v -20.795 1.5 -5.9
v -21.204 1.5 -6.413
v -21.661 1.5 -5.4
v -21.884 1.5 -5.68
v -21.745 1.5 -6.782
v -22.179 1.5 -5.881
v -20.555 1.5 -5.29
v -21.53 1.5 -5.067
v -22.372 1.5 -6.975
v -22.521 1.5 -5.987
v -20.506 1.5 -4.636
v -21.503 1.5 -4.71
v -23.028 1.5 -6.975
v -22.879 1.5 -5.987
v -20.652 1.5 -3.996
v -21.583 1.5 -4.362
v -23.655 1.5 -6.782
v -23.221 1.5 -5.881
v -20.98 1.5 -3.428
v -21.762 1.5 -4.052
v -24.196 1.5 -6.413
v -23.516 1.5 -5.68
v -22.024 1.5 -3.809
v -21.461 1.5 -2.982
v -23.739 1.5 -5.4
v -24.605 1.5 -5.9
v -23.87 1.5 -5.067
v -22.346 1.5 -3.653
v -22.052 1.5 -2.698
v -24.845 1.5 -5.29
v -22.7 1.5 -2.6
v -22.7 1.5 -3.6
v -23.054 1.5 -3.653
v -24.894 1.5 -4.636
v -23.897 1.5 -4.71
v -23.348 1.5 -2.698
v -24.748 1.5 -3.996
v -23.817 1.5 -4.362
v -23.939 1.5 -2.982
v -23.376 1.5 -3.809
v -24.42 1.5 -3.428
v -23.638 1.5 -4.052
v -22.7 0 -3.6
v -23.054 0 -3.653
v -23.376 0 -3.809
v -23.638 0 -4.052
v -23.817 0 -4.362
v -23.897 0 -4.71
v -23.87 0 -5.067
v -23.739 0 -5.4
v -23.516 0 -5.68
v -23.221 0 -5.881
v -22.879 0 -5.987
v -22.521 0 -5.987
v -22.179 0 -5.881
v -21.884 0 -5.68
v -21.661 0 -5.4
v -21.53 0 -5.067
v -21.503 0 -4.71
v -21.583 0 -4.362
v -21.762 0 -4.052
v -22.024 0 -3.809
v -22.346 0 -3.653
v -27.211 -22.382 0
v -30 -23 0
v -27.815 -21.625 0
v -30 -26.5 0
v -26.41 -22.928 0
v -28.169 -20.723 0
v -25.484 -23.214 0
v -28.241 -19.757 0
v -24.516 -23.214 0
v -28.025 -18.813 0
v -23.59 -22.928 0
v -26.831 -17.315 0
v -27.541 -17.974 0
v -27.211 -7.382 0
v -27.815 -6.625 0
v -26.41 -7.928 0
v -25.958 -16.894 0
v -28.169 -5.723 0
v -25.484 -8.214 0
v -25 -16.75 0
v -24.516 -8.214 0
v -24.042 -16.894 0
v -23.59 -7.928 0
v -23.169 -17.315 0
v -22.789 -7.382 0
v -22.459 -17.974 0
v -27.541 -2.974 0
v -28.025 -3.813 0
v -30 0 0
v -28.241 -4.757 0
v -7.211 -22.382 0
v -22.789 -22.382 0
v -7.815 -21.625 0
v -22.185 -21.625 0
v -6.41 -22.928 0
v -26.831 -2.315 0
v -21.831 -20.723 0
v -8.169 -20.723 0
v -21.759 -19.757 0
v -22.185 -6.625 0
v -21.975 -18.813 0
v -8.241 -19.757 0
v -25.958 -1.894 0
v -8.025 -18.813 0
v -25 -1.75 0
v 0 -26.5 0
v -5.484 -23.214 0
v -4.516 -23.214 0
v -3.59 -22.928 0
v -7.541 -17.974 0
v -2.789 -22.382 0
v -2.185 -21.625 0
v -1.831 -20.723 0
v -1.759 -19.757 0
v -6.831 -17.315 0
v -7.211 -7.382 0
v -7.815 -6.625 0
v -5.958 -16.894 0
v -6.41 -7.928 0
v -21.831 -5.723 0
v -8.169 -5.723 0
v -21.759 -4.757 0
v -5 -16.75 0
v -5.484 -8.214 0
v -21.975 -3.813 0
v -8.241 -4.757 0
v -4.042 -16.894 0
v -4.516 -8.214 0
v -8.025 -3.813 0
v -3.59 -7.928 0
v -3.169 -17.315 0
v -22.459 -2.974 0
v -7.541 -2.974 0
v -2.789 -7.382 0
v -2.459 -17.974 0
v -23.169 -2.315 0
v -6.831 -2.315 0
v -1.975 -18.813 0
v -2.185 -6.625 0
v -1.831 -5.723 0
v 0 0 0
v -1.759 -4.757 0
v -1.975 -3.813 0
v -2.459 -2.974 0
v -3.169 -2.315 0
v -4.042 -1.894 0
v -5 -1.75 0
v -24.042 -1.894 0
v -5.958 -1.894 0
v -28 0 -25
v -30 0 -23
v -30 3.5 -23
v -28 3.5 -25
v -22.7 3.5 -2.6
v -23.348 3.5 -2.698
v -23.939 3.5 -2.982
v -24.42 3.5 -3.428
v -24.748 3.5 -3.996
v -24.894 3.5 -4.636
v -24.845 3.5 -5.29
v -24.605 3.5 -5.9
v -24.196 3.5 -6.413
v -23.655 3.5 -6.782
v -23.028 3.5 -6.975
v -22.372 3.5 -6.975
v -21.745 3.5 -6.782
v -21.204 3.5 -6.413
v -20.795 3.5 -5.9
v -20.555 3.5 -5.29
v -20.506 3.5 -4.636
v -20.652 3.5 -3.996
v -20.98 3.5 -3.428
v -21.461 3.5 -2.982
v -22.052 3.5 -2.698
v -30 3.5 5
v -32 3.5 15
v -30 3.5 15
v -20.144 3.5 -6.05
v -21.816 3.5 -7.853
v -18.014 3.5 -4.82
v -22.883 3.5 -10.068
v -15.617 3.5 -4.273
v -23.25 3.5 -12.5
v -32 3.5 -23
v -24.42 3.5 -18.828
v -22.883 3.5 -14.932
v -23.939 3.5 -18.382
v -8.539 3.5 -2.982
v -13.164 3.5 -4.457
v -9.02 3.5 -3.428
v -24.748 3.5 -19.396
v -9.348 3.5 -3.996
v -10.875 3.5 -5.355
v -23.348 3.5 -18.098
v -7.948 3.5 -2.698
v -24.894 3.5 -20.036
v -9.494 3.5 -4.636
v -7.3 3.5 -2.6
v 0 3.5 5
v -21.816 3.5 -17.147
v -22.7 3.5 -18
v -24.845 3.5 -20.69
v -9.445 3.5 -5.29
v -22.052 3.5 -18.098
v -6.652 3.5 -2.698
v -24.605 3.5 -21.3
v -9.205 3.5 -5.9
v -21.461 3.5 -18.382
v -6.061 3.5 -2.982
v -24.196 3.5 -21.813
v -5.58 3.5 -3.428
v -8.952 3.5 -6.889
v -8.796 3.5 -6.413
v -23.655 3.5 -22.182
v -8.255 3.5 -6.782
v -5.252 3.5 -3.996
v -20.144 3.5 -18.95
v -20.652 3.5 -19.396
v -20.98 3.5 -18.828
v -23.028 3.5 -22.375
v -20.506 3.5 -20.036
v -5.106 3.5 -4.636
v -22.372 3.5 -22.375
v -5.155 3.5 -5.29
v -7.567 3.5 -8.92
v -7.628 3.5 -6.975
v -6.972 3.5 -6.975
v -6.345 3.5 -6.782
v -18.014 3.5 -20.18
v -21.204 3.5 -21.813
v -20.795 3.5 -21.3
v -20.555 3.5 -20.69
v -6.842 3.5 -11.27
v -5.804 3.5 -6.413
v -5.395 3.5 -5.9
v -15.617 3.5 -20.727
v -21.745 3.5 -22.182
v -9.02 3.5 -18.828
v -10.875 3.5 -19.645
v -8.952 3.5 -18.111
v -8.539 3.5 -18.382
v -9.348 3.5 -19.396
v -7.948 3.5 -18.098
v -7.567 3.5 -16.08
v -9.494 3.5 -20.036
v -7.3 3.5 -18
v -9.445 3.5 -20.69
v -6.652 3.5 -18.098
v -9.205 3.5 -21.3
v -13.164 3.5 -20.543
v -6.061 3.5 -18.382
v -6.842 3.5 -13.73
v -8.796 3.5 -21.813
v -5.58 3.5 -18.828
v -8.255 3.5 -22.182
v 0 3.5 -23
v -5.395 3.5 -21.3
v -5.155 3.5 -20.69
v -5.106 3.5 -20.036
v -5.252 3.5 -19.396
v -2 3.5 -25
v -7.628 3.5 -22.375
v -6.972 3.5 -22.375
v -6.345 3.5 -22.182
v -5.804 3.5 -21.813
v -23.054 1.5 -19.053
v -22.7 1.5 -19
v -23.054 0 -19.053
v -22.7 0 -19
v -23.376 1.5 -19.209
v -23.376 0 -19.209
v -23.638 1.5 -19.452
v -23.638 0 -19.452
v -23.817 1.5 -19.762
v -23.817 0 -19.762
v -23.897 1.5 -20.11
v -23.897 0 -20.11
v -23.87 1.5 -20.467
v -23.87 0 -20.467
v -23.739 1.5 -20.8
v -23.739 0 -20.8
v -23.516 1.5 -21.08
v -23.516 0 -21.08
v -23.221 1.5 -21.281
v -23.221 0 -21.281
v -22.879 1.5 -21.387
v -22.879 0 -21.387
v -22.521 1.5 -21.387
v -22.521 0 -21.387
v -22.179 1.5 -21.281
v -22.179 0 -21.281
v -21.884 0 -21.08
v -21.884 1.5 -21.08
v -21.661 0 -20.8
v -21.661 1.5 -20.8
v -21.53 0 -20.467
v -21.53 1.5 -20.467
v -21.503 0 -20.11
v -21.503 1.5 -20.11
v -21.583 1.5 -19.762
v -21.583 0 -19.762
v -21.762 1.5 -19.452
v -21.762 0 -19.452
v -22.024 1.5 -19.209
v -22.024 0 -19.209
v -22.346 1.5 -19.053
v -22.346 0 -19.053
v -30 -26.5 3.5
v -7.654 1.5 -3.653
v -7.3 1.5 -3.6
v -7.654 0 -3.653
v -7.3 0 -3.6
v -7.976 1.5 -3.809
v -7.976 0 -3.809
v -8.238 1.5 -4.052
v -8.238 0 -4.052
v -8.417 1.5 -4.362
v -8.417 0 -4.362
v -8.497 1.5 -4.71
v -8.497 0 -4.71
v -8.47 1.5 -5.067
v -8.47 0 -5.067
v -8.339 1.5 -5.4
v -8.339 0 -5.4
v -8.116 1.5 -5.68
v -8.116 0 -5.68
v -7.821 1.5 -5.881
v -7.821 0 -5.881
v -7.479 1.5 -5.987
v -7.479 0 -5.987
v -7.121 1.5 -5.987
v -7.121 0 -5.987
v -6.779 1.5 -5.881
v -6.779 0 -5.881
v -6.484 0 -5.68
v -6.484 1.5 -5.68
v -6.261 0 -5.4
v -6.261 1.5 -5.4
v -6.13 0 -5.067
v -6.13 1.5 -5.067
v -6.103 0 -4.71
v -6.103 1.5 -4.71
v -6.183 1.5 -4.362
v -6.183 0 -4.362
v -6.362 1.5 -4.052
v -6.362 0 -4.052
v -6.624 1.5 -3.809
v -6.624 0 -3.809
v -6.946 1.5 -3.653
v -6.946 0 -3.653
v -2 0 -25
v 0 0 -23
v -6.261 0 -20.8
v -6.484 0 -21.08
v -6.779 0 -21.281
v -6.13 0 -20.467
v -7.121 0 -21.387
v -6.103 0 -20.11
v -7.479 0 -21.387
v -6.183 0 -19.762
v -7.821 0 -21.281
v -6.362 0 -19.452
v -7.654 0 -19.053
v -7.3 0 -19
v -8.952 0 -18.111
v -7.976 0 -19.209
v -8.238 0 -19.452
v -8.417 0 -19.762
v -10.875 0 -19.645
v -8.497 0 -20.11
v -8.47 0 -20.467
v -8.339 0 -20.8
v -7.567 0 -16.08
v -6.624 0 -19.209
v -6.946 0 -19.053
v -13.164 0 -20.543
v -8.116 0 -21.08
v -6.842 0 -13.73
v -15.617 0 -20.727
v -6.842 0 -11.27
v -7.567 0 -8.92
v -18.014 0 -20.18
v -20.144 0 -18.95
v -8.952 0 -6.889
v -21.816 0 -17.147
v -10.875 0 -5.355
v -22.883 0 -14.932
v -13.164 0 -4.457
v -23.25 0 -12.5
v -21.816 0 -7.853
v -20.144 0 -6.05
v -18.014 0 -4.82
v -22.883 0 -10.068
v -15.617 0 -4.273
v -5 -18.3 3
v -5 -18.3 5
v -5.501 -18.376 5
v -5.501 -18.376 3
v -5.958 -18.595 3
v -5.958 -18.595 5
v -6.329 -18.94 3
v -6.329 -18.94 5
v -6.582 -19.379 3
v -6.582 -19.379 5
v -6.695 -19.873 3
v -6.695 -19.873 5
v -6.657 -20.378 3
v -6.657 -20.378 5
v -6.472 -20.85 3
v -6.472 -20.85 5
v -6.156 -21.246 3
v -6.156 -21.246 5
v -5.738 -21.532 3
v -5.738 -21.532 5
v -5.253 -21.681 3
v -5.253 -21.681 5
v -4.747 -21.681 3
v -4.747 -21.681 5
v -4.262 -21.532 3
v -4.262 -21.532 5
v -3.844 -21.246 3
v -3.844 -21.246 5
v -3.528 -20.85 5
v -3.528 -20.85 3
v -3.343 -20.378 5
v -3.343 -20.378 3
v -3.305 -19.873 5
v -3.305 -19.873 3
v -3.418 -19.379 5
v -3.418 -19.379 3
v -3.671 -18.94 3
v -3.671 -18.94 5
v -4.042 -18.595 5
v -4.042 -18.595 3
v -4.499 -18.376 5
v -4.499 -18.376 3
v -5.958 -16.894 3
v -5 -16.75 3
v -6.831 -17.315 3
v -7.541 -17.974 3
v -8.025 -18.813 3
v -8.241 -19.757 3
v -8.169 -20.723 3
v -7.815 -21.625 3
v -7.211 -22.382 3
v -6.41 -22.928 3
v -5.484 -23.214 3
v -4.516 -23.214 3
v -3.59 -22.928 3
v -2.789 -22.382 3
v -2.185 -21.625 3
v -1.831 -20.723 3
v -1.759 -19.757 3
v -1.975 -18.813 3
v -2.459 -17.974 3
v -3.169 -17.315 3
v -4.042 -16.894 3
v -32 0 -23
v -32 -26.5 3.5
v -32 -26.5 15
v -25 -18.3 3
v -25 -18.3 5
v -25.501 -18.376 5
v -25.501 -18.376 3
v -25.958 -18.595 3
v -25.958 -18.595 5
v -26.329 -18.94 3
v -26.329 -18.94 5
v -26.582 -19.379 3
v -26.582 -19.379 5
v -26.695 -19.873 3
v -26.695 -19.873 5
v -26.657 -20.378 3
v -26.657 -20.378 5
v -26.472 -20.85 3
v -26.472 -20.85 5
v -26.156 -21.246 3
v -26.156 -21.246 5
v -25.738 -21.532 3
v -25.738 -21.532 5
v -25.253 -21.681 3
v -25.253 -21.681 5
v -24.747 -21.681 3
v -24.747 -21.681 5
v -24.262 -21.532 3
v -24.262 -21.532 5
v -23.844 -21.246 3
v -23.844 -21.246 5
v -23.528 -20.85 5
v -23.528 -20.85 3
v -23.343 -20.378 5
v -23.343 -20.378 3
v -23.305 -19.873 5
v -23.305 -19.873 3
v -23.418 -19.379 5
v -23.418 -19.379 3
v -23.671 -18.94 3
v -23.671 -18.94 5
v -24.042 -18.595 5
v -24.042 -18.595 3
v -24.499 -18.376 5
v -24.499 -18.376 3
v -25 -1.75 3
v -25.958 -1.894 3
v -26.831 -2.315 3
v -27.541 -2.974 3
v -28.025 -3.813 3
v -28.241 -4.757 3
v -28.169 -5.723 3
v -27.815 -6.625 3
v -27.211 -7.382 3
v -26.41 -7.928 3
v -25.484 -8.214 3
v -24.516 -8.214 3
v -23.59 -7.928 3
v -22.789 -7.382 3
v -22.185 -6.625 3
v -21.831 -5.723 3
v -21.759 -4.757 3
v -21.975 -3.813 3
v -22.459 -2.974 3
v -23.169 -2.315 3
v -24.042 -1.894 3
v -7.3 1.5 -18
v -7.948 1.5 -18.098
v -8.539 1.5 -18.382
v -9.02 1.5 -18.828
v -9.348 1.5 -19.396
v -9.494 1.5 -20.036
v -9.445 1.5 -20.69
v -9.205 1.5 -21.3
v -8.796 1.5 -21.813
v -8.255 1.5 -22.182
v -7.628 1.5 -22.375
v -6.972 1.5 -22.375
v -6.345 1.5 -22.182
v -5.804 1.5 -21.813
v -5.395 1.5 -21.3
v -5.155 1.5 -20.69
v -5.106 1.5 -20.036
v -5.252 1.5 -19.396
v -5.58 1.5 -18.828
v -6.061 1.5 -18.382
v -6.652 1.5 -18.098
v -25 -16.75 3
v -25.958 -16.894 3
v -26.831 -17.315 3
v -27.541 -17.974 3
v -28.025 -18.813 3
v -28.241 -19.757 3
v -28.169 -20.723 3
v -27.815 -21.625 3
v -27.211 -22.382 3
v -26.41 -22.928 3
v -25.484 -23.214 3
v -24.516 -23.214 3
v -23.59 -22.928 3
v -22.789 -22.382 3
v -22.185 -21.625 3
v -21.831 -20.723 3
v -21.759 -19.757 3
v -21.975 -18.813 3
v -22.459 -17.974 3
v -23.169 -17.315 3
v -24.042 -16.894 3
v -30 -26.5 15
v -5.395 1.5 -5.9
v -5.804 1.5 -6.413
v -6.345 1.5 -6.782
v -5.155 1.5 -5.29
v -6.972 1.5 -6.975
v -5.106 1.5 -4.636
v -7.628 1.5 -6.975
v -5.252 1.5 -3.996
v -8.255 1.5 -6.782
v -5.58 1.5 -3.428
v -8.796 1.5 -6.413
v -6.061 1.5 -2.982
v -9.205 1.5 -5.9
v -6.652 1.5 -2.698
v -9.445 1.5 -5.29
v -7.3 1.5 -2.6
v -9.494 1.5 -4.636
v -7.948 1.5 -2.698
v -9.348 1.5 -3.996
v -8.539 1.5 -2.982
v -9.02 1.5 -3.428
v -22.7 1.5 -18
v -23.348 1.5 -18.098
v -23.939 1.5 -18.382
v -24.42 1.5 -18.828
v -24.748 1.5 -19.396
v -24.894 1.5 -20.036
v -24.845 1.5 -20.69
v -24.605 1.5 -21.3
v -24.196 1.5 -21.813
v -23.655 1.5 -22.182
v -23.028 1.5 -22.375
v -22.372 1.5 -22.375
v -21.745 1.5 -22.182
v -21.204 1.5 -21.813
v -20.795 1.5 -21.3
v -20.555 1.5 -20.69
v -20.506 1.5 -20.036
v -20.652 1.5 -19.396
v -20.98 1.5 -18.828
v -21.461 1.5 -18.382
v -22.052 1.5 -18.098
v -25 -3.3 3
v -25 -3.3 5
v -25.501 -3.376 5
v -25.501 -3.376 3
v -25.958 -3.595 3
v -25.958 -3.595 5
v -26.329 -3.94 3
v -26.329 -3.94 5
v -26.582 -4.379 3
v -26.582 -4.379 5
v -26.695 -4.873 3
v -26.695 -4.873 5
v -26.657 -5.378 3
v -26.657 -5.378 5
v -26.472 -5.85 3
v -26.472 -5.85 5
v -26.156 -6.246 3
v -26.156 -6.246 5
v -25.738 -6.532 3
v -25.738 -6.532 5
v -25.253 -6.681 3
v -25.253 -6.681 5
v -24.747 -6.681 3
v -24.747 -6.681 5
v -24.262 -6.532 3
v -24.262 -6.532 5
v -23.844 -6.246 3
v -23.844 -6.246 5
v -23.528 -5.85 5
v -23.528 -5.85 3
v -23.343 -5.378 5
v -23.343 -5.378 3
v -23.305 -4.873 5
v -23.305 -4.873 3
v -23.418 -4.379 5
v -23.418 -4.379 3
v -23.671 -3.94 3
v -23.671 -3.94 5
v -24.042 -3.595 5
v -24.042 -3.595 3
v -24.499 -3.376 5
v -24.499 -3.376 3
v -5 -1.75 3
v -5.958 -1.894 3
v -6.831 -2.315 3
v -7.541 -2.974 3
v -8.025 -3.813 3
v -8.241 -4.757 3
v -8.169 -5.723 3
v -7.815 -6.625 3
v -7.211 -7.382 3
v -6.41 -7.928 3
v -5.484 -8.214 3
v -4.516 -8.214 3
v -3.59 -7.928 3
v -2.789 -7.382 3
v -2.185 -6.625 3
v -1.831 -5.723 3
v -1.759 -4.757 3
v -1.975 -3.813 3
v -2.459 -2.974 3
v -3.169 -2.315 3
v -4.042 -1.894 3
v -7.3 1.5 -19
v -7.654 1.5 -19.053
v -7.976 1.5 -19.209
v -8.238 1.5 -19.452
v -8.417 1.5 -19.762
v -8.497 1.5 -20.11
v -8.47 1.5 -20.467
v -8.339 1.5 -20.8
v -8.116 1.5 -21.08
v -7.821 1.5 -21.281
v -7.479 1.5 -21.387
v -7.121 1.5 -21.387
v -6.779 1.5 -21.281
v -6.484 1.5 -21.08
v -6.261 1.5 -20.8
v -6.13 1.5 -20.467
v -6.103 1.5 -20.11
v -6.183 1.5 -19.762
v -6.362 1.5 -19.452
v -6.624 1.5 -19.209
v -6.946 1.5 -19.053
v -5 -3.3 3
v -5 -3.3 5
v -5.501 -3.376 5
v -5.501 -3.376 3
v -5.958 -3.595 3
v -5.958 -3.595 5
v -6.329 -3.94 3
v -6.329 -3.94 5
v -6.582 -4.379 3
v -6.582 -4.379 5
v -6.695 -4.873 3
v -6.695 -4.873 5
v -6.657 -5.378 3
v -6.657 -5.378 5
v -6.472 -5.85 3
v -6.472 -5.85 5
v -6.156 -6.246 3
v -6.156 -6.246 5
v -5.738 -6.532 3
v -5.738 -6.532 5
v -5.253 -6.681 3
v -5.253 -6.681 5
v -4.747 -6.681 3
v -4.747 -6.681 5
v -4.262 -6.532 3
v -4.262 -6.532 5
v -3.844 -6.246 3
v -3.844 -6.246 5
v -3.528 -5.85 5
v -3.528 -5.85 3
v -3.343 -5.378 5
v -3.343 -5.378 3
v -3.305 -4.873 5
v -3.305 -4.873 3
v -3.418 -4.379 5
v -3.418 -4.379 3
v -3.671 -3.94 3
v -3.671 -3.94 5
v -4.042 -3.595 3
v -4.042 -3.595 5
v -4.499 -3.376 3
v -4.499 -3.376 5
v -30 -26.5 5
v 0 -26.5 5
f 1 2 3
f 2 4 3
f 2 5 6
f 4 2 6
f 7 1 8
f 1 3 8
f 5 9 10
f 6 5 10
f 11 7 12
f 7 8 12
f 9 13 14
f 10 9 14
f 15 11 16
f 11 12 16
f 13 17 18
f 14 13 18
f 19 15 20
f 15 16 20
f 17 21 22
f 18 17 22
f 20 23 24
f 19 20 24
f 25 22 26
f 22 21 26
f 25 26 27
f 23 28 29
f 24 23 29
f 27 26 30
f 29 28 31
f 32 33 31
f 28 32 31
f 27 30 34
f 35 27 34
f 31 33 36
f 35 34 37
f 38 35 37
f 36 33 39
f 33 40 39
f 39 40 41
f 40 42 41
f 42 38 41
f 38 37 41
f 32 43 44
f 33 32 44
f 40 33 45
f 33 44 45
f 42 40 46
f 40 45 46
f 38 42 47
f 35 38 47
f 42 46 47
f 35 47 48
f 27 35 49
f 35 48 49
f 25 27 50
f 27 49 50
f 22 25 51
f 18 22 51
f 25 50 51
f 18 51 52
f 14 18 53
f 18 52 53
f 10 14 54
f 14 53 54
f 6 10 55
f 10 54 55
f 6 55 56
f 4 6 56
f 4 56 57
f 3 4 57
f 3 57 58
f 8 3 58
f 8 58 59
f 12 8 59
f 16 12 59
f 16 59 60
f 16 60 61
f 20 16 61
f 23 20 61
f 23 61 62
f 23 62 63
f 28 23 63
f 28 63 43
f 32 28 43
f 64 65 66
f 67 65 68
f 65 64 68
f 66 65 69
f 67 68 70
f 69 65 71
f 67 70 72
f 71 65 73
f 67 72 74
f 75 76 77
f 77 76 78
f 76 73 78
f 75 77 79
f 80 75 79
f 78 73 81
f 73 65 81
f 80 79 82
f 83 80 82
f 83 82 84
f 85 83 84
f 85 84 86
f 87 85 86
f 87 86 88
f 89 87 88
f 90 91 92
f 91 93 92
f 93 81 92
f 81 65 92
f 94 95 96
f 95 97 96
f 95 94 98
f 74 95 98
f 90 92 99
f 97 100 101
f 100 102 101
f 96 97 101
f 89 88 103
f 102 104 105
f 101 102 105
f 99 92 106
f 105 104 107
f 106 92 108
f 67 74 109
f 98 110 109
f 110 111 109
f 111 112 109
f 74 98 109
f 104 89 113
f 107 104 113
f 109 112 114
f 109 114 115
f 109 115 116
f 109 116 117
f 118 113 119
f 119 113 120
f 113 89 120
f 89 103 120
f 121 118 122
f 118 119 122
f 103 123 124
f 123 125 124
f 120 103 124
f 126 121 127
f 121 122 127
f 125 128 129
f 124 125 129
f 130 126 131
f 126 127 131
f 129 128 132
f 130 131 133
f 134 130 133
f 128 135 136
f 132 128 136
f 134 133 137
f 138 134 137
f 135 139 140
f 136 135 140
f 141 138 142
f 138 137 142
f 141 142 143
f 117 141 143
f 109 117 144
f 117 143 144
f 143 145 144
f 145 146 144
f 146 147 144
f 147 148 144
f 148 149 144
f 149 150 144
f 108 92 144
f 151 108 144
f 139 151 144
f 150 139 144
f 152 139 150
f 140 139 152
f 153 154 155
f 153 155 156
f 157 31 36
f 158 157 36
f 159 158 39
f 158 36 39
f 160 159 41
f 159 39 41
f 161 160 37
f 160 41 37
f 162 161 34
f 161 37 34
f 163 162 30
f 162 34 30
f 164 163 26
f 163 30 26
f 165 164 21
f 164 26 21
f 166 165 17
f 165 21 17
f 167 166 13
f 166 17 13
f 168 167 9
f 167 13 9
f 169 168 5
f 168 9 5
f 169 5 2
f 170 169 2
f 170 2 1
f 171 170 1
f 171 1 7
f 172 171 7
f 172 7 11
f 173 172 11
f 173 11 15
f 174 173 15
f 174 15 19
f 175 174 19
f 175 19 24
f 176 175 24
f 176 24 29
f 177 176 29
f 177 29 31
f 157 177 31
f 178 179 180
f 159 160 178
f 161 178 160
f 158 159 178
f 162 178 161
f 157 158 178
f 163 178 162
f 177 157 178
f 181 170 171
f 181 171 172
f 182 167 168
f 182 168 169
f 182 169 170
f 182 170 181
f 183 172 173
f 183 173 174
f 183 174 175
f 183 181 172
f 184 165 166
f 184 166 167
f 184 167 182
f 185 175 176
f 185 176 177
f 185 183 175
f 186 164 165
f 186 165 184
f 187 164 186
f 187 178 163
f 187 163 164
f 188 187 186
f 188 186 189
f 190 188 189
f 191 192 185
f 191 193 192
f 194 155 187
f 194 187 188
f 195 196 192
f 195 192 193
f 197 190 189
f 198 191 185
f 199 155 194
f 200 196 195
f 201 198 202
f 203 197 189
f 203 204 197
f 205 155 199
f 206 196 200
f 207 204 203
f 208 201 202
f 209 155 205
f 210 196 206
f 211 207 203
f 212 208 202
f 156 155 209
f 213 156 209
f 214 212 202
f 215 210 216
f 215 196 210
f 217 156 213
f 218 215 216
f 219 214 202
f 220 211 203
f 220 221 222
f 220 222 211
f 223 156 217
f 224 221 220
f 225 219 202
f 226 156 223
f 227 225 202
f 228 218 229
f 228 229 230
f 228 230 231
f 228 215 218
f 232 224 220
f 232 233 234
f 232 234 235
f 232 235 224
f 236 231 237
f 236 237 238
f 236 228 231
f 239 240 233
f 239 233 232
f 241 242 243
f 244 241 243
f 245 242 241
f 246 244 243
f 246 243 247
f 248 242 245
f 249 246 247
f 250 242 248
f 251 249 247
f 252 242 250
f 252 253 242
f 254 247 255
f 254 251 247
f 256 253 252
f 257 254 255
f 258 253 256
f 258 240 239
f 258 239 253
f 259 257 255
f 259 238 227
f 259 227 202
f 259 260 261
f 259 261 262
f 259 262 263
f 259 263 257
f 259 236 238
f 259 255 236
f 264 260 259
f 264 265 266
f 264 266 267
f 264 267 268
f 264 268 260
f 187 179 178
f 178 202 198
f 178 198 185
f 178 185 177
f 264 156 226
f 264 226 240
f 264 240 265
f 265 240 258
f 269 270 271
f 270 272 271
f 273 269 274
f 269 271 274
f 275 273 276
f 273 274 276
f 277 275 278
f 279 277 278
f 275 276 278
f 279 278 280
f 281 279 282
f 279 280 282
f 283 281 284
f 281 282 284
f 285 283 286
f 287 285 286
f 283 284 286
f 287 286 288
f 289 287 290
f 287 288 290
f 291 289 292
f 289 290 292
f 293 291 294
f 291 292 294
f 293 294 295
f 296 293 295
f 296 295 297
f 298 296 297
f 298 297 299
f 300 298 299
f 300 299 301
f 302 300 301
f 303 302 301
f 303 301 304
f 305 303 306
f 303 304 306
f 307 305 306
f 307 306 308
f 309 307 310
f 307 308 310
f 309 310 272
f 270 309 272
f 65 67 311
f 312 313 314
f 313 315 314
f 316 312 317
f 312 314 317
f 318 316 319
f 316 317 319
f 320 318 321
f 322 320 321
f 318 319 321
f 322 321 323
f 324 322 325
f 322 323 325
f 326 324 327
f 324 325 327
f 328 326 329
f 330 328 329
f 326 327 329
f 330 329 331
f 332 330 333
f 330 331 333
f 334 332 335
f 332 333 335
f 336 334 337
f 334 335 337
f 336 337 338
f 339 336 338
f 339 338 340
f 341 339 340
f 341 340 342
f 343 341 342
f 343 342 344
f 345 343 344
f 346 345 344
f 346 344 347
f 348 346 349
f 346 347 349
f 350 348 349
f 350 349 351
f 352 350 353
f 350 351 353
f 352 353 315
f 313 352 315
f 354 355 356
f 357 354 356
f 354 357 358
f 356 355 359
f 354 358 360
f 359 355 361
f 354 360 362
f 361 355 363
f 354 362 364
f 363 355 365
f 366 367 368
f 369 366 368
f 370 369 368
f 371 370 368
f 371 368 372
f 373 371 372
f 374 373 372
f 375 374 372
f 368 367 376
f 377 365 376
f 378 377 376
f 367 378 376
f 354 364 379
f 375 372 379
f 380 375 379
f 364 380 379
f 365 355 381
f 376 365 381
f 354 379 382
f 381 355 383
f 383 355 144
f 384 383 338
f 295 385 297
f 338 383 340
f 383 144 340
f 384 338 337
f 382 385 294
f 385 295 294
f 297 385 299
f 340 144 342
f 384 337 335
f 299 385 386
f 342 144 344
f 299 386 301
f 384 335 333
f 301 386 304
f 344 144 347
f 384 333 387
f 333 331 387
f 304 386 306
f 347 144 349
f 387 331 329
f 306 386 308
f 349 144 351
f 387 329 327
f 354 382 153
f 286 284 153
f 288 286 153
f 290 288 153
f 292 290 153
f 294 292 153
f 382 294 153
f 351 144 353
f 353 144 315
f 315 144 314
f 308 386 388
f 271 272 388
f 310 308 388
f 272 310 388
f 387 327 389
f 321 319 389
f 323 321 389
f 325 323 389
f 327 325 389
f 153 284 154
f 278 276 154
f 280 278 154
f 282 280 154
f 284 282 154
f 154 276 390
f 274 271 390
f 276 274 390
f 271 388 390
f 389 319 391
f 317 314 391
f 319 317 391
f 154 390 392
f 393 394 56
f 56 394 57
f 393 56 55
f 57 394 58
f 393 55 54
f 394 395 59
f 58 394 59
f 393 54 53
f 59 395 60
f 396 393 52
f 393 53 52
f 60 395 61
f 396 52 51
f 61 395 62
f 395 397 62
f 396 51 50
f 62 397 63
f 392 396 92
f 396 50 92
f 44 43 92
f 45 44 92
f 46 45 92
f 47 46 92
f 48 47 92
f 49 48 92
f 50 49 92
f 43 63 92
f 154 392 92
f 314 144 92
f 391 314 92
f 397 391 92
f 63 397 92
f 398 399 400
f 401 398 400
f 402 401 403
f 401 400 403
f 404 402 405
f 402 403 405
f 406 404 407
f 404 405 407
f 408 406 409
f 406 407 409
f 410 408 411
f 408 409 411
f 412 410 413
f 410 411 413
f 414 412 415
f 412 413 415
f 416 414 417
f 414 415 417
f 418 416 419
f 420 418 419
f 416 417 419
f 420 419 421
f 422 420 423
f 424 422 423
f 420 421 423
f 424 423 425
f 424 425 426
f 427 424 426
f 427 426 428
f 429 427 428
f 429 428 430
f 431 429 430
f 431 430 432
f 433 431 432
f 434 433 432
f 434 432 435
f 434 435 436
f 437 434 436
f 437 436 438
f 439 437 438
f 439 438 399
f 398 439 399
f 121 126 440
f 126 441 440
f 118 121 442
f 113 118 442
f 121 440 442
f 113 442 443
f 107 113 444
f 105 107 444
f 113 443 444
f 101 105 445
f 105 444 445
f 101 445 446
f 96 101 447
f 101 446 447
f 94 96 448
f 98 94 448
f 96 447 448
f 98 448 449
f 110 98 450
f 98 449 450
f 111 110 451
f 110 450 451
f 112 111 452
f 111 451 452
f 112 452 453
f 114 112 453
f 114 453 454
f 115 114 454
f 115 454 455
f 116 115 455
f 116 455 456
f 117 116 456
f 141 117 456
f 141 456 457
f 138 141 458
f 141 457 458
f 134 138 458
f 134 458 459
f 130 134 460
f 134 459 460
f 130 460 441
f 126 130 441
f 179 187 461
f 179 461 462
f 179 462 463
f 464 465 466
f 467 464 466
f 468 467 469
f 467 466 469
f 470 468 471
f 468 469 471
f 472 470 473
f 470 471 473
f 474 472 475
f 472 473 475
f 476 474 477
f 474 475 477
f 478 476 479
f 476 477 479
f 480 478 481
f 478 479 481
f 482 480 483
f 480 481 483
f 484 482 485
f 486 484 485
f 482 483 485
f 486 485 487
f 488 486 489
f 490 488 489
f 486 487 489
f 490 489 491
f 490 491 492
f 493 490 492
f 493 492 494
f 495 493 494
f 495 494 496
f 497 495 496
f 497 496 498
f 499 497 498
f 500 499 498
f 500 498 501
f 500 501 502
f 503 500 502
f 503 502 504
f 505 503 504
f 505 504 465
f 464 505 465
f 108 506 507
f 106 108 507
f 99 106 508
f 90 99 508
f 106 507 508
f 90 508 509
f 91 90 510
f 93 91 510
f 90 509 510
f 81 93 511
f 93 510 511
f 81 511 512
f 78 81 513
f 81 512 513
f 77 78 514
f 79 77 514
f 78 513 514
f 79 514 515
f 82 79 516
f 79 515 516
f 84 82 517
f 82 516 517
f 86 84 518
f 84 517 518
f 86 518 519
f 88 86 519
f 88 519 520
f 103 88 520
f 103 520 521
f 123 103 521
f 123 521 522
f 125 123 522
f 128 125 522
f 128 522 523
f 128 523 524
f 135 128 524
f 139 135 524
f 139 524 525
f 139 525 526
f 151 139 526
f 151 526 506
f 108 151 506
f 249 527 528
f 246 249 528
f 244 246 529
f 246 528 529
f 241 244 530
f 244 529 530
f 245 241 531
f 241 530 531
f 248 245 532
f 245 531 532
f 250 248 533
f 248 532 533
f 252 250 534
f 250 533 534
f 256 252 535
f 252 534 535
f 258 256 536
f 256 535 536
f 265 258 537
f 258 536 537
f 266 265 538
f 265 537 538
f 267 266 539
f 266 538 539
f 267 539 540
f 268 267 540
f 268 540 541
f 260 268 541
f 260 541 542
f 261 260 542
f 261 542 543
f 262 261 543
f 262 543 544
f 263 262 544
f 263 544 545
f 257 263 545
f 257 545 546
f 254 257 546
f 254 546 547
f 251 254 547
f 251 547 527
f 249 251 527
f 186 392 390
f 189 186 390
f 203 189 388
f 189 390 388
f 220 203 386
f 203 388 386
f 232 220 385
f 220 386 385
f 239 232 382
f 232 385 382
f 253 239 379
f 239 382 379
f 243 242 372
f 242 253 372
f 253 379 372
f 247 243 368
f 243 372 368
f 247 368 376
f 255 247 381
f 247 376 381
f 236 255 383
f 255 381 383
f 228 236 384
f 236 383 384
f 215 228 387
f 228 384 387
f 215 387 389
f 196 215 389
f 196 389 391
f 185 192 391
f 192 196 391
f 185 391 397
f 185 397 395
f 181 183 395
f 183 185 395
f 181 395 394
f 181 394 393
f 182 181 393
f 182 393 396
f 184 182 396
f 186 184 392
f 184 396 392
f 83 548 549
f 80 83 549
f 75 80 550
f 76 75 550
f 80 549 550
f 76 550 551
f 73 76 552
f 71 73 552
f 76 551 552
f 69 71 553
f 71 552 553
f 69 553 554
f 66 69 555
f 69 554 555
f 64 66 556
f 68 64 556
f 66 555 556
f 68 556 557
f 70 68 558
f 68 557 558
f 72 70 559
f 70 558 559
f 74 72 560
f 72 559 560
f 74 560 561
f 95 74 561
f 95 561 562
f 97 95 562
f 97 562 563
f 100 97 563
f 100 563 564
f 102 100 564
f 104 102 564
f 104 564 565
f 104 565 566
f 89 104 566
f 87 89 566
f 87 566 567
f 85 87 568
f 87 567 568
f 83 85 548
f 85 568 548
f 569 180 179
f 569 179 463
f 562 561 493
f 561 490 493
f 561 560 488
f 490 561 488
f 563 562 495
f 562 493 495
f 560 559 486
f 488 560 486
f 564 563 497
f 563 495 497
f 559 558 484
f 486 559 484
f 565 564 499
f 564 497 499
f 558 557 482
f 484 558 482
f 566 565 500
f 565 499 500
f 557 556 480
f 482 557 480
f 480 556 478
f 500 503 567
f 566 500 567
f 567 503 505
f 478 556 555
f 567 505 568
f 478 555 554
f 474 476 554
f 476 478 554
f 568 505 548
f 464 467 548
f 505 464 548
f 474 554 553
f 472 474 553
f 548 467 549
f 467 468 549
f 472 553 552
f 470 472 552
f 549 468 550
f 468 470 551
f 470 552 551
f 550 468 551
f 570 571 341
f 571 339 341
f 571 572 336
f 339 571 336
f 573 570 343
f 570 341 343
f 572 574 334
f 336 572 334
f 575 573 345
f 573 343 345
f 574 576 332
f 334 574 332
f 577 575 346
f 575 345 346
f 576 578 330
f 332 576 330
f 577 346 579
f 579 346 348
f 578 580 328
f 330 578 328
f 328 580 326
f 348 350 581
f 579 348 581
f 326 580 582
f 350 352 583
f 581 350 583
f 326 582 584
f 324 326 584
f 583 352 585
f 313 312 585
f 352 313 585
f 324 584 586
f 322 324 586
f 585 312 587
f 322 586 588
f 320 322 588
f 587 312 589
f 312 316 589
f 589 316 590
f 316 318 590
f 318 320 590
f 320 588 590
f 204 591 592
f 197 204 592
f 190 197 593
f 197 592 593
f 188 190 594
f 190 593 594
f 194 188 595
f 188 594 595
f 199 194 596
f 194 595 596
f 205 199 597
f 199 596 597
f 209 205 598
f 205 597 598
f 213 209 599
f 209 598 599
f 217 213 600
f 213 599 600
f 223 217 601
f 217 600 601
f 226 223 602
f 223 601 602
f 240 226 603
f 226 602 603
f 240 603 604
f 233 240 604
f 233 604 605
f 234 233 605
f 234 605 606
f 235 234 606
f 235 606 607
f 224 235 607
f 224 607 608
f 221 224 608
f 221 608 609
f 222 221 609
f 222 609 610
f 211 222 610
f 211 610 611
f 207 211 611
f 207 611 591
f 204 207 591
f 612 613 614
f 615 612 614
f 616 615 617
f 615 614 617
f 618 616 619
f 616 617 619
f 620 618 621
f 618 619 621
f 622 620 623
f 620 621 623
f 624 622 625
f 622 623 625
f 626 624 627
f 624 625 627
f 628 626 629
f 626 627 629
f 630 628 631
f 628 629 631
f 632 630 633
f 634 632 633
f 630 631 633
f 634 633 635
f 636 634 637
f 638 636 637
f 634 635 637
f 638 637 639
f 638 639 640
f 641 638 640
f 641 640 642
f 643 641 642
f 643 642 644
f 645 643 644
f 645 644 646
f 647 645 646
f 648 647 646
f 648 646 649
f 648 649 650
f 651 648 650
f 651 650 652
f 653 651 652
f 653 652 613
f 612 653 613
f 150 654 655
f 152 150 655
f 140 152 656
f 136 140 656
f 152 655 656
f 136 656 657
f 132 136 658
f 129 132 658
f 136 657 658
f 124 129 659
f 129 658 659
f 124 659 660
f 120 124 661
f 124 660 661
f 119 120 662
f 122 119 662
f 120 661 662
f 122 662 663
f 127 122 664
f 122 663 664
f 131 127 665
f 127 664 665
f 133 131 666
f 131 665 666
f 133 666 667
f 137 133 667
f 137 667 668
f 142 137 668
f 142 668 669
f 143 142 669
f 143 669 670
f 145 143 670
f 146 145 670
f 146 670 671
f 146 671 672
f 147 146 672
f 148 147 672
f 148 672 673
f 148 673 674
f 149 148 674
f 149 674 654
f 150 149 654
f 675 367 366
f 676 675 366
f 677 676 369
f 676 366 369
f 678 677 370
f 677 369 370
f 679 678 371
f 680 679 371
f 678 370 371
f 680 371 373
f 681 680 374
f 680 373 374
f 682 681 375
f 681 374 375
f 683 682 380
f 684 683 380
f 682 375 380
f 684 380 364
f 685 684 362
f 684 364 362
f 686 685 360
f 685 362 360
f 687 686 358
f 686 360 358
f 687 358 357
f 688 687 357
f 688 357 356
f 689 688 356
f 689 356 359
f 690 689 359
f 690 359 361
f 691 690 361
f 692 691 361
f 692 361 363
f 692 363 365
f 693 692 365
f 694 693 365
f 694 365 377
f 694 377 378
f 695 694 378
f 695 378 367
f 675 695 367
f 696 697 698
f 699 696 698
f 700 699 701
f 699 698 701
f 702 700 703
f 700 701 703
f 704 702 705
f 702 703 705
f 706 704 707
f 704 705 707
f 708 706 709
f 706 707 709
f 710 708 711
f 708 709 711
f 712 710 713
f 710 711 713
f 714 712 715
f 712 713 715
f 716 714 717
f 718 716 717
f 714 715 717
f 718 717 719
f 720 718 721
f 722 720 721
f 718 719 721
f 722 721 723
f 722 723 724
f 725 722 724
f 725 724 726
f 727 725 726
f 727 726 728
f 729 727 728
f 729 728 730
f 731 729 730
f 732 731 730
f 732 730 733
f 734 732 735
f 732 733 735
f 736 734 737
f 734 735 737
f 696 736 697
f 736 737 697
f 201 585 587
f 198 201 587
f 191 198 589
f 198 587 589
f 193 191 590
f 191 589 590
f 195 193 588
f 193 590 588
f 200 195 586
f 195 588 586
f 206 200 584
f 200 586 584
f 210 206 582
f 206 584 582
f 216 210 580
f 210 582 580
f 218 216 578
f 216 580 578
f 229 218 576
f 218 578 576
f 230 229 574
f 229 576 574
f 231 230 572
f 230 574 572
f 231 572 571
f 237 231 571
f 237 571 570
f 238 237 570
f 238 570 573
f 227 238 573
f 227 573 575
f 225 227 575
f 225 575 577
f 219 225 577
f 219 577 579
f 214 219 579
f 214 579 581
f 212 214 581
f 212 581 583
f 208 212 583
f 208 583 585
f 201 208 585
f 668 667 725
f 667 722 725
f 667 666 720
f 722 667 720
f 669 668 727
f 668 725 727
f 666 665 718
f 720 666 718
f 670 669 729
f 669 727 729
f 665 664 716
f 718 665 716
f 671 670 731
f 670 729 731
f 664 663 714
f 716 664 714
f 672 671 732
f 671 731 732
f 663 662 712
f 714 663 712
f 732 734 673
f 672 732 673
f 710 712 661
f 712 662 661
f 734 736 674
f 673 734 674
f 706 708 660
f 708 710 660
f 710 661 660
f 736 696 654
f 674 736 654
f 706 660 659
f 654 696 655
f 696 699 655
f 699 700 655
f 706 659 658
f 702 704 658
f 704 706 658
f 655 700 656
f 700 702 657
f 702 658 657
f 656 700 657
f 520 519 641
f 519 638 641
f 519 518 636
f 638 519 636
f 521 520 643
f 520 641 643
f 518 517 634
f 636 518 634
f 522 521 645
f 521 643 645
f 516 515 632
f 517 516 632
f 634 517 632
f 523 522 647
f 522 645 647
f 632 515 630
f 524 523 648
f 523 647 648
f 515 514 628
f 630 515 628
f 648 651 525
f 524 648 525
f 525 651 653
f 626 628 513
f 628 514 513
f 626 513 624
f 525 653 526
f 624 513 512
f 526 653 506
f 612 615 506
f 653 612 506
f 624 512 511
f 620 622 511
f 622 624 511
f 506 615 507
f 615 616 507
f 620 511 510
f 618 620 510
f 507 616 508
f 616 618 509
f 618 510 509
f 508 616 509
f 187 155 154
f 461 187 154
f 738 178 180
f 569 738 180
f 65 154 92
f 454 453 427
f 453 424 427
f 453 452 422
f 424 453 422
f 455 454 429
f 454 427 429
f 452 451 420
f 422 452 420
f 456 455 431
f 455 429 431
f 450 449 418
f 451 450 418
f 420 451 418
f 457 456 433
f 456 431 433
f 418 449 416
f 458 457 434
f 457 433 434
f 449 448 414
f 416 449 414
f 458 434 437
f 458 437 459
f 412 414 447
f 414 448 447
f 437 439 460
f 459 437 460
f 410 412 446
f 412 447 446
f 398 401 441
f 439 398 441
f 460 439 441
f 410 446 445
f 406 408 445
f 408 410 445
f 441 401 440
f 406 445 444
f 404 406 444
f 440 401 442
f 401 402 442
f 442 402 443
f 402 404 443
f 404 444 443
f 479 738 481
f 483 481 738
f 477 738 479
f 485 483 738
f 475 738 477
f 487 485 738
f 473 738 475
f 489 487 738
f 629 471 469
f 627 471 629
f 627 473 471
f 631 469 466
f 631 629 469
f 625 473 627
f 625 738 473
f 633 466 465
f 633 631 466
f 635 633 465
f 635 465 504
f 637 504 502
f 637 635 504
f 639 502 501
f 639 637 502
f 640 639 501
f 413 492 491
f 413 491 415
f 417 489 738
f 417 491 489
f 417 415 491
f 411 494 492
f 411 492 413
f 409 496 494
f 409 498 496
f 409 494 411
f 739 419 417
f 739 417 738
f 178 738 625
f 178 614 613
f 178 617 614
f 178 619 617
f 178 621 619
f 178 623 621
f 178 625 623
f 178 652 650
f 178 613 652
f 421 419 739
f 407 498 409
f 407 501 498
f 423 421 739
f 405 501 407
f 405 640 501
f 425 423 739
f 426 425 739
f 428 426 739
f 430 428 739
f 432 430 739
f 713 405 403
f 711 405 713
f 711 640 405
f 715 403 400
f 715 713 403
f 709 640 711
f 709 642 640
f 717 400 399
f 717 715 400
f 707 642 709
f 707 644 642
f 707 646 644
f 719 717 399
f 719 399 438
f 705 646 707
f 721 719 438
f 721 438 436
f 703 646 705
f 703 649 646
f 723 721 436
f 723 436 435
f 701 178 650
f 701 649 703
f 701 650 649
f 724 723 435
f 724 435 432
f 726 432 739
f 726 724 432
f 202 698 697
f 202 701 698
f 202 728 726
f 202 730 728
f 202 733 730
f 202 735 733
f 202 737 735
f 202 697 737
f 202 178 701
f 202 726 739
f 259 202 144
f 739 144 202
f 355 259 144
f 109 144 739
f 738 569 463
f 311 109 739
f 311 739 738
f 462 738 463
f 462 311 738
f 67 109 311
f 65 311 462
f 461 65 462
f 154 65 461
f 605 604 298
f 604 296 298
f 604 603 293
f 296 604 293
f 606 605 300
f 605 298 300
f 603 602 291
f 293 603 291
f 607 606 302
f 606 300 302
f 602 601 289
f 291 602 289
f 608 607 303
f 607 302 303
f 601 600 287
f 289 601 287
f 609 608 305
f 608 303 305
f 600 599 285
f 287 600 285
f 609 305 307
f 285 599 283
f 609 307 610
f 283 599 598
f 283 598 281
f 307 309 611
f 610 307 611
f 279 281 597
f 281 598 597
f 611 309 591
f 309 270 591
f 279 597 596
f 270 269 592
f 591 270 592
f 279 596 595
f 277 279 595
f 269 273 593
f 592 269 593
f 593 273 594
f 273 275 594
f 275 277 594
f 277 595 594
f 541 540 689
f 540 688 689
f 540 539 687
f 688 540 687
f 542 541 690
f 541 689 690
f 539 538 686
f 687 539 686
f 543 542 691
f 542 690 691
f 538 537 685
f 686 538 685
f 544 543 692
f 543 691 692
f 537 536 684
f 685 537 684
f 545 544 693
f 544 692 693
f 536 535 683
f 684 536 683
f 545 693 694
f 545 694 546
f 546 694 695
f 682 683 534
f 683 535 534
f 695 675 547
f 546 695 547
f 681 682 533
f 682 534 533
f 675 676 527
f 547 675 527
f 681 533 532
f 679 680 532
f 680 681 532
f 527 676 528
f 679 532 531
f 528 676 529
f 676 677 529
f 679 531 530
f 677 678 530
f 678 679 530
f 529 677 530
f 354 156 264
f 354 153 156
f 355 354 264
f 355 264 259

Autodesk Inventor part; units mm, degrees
ref_plane "YZ Plane" through (0, 0, 0) normal (1, 0, 0) x (0, 1, 0)
ref_plane "XZ Plane" through (0, 0, 0) normal (0, 1, 0) x (-1, 0, 0)
ref_plane "XY Plane" through (0, 0, 0) normal (0, 0, 1) x (1, 0, 0)
sketch "Esquisse1" plane through (0, 0, 0) normal (0, 1, 0) x (-1, 0, 0)
  line L0 (0, 0) -> (30, 0)
  line L1 (30, 0) -> (30, -23)
  line L2 (28, -25) -> (2, -25)
  line L3 (0, -23) -> (0, 0)
  circle A0 centre (15, -12.5) radius 8.25
  line L4 (30, -23) -> (28, -25)
  line L5 (2, -25) -> (0, -23)
  point P0 (0, 0)
  point P1 (30, -25)
  point P2 (0, -25)
  point P3 (11.5, 0)
  point P4 (30, -4)
  point P5 (21, 0)
  point P6 (0, -2)
  point P7 (2, 0)
  dimension "d0" = 25
  dimension "d1" = 30
  dimension "d2" = 16.5
  dimension "d3" = 15
  dimension "d11" = 2
  dimension "d12" = 2
  dimension "d13" = 2
  dimension "d14" = 2
  dimension "d47" = 12.5
extrude "Extrusion1" add sketch "Esquisse1" along normal blind 3.5
sketch "Esquisse2" plane through (0, 3.5, 0) normal (0, 1, 0) x (1, 0, 0)
  circle A0 centre (-15, 12.5) radius 8.25 construction
  circle A1 centre (-15, 12.5) radius 10.8894 construction
  line L0 (-22.7, 4.8) -> (-22.7, 20.2) construction
  line L1 (-22.7, 20.2) -> (-7.3, 20.2) construction
  line L2 (-7.3, 20.2) -> (-7.3, 4.8) construction
  line L3 (-7.3, 4.8) -> (-22.7, 4.8) construction
  point P0 (0, 0)
  dimension "d19" = 15.4
  dimension "d20" = 15.4
hole "Perçage1" at (-22.7, 3.5, -4.8) at (-22.7, 3.5, -20.2) at (-7.3, 3.5, -20.2) at (-7.3, 3.5, -4.8) direction (0, -1, 0) diameter 2.4 end through all counterbore diameter 4.4 counterbore depth 2 clearance for "Vis d'assemblage à six pans creux" size "M2" standard "Profil M métrique ANSI"
sketch "Esquisse3" plane through (-30, 0, 0) normal (0, 0, 1) x (1, 0, 0)
  line L0 (0, 3.5) -> (30, 3.5) projected
  line L1 (0, 3.5) -> (30, 3.5)
  line L2 (30, 3.5) -> (30, -26.5)
  line L3 (30, -26.5) -> (0, -26.5)
  line L4 (0, -26.5) -> (0, 3.5)
  point P0 (30, 0)
  point P1 (30, 3.5)
  dimension "d29" = 30
  dimension "d48" = 30
  dimension "d49" = 30
extrude "Extrusion2" add sketch "Esquisse3" along normal blind 5
sketch "Esquisse4" plane through (-30, 0, -23) normal (-1, 0, 0) x (0, 0, 1)
  line L0 (0, 3.5) -> (28, 3.5) projected
  line L1 (28, 3.5) -> (0, 3.5)
  line L2 (0, 3.5) -> (0, 0)
  line L3 (0, 0) -> (-2, 0) projected
  line L4 (26.5, -26.5) -> (0, 0)
  line L5 (28, 3.5) -> (28, -26.5) projected
  line L6 (28, -26.5) -> (26.5, -26.5)
  line L7 (28, 3.5) -> (38, 3.5)
  line L8 (38, 3.5) -> (38, -26.5)
  line L9 (38, -26.5) -> (21.647, -26.5)
  point P0 (23, 0)
  point P1 (24.5, -21)
  point P2 (0, 3.5)
  point P3 (21, -21)
  dimension "d50" = 30
  dimension "d51" = 30
  dimension "d52" = 10
extrude "Extrusion3" add sketch "Esquisse4" along normal blind 2
sketch "Esquisse5" plane through (-30, 0, 0) normal (0, 0, -1) x (-1, 0, 0)
  line L0 (-5, -5) -> (-25, -5) construction
  line L1 (-25, -5) -> (-25, -20) construction
  line L2 (-25, -20) -> (-5, -20) construction
  line L3 (-5, -20) -> (-5, -5) construction
  line L4 (-28, 0) -> (-2, 0) construction
  line L5 (0, 0) -> (0, -23) construction
  point P0 (-30, 0)
  point P1 (0, -21)
  dimension "d36" = 15
  dimension "d37" = 20
  dimension "d38" = 5
  dimension "d39" = 5
hole "Perçage2" at (-25, -5, 0) at (-25, -20, 0) at (-5, -20, 0) at (-5, -5, 0) direction (0, 0, 1) diameter 3.4 end through all counterbore diameter 6.5 counterbore depth 3 clearance for "Vis d'assemblage à six pans creux" size "M3" standard "Profil M métrique ANSI"
equation "\"d3\" = 0.5 * d1"
equation "\"d11\" = d9"
equation "\"d12\" = d11"
equation "\"d13\" = d9"
equation "\"d14\" = d13"
equation "\"d47\" = 0.5 * d0"
equation "\"d20\" = d19"
equation "\"d48\" = d49"
equation "\"d51\" = d50"
equation "\"d9\" = 2"
properties part number "support nema8"
